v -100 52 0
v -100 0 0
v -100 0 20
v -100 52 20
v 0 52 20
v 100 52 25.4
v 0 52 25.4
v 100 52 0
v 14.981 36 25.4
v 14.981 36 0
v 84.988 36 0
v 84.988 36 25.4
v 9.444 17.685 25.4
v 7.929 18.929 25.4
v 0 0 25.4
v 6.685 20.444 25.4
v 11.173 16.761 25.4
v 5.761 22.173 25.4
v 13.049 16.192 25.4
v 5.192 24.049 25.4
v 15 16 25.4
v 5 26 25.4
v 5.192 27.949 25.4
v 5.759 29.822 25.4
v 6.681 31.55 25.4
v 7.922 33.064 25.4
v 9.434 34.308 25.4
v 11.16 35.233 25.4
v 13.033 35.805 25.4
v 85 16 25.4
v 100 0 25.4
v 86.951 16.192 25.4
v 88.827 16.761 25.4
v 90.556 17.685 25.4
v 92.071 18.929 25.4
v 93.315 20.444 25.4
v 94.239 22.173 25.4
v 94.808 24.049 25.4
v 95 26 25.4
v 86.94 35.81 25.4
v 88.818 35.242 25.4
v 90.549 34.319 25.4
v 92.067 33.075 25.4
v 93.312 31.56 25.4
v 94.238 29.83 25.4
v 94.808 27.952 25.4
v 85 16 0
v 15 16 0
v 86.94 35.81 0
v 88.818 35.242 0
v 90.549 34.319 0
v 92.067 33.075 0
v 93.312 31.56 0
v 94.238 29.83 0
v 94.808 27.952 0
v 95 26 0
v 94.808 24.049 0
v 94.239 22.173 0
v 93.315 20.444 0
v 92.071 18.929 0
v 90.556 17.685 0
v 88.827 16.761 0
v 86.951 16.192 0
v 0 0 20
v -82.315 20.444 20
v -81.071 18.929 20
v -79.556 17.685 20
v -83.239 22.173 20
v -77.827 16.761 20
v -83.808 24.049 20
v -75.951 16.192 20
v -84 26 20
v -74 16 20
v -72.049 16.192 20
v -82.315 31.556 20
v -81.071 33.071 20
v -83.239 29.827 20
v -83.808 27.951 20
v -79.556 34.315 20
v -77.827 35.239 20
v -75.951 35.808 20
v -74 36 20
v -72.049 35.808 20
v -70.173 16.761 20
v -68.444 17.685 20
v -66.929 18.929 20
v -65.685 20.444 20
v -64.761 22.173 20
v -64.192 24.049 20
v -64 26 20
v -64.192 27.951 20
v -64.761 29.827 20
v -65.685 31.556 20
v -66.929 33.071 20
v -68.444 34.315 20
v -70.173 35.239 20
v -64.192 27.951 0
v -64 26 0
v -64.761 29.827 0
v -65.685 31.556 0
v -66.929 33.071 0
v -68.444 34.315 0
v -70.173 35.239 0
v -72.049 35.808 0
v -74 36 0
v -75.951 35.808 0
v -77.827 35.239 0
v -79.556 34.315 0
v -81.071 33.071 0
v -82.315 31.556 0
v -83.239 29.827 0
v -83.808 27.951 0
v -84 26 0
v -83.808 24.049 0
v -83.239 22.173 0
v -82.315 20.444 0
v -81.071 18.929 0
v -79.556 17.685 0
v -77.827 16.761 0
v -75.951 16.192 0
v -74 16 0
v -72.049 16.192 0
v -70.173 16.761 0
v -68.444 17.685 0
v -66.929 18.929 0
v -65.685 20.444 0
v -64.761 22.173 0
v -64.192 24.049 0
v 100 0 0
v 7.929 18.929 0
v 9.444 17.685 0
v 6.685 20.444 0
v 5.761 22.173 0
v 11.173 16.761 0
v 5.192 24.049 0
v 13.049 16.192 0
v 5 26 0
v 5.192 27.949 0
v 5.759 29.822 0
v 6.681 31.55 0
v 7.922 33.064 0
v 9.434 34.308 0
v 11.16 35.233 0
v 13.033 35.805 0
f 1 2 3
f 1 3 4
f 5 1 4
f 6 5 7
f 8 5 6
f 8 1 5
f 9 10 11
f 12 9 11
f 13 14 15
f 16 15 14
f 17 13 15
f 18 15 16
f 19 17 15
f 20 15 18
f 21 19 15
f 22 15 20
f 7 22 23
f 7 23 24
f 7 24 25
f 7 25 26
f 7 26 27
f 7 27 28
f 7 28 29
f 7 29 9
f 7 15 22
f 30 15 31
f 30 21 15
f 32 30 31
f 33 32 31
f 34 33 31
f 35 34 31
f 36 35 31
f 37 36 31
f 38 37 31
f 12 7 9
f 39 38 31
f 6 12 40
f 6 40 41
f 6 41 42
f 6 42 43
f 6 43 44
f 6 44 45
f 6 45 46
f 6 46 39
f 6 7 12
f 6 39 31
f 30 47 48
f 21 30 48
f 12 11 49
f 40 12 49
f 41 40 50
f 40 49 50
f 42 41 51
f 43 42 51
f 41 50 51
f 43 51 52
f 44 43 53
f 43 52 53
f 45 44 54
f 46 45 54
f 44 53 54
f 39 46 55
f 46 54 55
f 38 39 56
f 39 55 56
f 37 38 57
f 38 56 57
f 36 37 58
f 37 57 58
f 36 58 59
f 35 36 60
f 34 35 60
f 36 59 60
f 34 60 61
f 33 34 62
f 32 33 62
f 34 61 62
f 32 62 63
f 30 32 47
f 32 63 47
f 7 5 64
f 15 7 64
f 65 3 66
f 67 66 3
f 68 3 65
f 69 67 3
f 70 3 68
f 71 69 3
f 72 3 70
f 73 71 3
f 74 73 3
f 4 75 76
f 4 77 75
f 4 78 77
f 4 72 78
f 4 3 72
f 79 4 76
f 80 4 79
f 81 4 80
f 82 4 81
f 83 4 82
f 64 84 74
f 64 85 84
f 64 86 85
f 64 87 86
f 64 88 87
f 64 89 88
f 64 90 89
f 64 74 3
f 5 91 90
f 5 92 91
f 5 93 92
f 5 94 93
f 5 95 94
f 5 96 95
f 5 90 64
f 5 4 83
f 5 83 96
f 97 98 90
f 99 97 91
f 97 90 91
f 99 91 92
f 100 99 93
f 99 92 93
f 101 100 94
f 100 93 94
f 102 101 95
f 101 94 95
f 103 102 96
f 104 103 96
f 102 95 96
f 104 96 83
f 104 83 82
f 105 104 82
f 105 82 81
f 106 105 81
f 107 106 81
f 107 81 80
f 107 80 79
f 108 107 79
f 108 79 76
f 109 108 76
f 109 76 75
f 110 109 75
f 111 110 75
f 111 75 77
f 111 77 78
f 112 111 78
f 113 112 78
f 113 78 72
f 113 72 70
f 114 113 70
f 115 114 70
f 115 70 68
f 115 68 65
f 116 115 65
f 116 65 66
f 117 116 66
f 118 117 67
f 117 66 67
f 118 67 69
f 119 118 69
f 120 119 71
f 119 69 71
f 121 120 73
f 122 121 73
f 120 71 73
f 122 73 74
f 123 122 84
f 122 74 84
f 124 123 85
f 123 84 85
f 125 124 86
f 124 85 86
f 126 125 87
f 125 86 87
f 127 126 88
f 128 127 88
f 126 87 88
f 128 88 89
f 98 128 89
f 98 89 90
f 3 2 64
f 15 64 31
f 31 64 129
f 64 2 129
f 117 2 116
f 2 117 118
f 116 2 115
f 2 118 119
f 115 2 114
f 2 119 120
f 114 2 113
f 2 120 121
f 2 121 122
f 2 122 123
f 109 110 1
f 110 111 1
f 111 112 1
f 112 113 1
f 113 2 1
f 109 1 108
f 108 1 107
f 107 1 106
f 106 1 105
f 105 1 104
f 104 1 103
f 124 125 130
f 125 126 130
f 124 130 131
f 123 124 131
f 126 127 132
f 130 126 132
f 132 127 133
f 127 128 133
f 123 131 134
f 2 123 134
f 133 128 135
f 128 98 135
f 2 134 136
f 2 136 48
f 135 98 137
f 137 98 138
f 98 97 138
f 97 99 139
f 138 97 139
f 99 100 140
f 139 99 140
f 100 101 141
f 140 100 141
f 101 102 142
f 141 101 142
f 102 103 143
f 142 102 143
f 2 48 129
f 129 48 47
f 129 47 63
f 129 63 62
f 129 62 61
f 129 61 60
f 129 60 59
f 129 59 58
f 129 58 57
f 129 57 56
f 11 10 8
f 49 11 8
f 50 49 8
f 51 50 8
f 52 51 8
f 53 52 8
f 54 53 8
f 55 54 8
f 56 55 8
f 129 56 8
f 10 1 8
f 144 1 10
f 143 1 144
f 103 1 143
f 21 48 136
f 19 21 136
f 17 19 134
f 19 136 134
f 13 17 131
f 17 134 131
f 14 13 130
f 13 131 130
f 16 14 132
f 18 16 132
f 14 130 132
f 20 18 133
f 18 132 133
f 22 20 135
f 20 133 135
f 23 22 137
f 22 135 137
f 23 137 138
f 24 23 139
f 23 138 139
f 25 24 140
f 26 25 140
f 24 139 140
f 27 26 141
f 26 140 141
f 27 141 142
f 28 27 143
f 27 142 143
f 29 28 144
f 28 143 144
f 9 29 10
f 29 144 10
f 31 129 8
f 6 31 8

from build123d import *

# Parameters (mm, degrees)
F1_DEPTH = 20
F3_DEPTH = 25.4
F4_DEPTH = 25.4
F5_W     = 100
F5_H     = 52
F6_DEPTH = 20
F8_DEPTH = 25.4
F9_DEPTH = 25.4


with BuildPart() as f1:
    # F0 (on Top) → F1 (new body)
    with BuildSketch(Plane.XY):
        with BuildLine():
            Line((0, 26), (0, 0))
            Line((0, 0), (100, 0))
            Line((100, 0), (100, 26))
            Line((100, 26), (95, 26))
            ThreePointArc((95, 26), (92.0710678119, 18.9289321881), (85, 16))
            Line((85, 16), (15, 16))
            ThreePointArc((15, 16), (7.9289321881, 18.9289321881), (5, 26))
            Line((5, 26), (0, 26))
        make_face()
    extrude(amount=F1_DEPTH)

    # F2 (on face) → F3 (cut)
    with BuildSketch(Plane.XY.offset(20)):
        Polygon((85.6833907061, 35.9766215295), (15.6840754541, 35.9765746012), (15.6840754541, 16.0234253988), (85.6833907061, 16.0233784705), align=None)
    extrude(amount=-F3_DEPTH, mode=Mode.SUBTRACT)

    # F2 (on face) → F4 (cut)
    with BuildSketch(Plane.XY.offset(20)):
        Polygon((85.6833907061, 35.9766215295), (15.6840754541, 35.9765746012), (15.6840754541, 16.0234253988), (85.6833907061, 16.0233784705), align=None)
    extrude(amount=-F4_DEPTH, mode=Mode.SUBTRACT)

    # F5 (on Top) → F6 (join)
    with BuildSketch(Plane.XY):
        with Locations((-50, 26)):
            Rectangle(F5_W, F5_H)
    extrude(amount=F6_DEPTH)

    # F7 (on face) → F8 (cut)
    with BuildSketch(Plane.XY.offset(20)):
        with BuildLine():
            ThreePointArc((-84, 26), (-74, 16), (-64, 26))
            ThreePointArc((-64, 26), (-74, 36), (-84, 26))
        make_face()
    extrude(amount=-F8_DEPTH, mode=Mode.SUBTRACT)

    # F0 (on Top) → F9 (join)
    with BuildSketch(Plane.XY):
        with BuildLine():
            Line((0, 26), (0, 0))
            Line((0, 0), (100, 0))
            Line((100, 0), (100, 26))
            Line((100, 26), (95, 26))
            ThreePointArc((95, 26), (92.0710678119, 18.9289321881), (85, 16))
            Line((85, 16), (15, 16))
            ThreePointArc((15, 16), (7.9289321881, 18.9289321881), (5, 26))
            Line((5, 26), (0, 26))
        make_face()
        with BuildLine():
            Line((0, 52), (0, 26))
            Line((0, 26), (5, 26))
            ThreePointArc((5, 26), (7.9221367888, 33.0642658758), (14.9807704728, 35.9999815112))
            Line((14.9807704728, 35.9999815112), (84.9876315002, 35.999992351))
            ThreePointArc((84.9876315002, 35.999992351), (92.0666935338, 33.0754393856), (95, 26))
            Line((95, 26), (100, 26))
            Line((100, 26), (100, 52))
            Line((100, 52), (0, 52))
        make_face()
    extrude(amount=F9_DEPTH)


solid = f1.part
